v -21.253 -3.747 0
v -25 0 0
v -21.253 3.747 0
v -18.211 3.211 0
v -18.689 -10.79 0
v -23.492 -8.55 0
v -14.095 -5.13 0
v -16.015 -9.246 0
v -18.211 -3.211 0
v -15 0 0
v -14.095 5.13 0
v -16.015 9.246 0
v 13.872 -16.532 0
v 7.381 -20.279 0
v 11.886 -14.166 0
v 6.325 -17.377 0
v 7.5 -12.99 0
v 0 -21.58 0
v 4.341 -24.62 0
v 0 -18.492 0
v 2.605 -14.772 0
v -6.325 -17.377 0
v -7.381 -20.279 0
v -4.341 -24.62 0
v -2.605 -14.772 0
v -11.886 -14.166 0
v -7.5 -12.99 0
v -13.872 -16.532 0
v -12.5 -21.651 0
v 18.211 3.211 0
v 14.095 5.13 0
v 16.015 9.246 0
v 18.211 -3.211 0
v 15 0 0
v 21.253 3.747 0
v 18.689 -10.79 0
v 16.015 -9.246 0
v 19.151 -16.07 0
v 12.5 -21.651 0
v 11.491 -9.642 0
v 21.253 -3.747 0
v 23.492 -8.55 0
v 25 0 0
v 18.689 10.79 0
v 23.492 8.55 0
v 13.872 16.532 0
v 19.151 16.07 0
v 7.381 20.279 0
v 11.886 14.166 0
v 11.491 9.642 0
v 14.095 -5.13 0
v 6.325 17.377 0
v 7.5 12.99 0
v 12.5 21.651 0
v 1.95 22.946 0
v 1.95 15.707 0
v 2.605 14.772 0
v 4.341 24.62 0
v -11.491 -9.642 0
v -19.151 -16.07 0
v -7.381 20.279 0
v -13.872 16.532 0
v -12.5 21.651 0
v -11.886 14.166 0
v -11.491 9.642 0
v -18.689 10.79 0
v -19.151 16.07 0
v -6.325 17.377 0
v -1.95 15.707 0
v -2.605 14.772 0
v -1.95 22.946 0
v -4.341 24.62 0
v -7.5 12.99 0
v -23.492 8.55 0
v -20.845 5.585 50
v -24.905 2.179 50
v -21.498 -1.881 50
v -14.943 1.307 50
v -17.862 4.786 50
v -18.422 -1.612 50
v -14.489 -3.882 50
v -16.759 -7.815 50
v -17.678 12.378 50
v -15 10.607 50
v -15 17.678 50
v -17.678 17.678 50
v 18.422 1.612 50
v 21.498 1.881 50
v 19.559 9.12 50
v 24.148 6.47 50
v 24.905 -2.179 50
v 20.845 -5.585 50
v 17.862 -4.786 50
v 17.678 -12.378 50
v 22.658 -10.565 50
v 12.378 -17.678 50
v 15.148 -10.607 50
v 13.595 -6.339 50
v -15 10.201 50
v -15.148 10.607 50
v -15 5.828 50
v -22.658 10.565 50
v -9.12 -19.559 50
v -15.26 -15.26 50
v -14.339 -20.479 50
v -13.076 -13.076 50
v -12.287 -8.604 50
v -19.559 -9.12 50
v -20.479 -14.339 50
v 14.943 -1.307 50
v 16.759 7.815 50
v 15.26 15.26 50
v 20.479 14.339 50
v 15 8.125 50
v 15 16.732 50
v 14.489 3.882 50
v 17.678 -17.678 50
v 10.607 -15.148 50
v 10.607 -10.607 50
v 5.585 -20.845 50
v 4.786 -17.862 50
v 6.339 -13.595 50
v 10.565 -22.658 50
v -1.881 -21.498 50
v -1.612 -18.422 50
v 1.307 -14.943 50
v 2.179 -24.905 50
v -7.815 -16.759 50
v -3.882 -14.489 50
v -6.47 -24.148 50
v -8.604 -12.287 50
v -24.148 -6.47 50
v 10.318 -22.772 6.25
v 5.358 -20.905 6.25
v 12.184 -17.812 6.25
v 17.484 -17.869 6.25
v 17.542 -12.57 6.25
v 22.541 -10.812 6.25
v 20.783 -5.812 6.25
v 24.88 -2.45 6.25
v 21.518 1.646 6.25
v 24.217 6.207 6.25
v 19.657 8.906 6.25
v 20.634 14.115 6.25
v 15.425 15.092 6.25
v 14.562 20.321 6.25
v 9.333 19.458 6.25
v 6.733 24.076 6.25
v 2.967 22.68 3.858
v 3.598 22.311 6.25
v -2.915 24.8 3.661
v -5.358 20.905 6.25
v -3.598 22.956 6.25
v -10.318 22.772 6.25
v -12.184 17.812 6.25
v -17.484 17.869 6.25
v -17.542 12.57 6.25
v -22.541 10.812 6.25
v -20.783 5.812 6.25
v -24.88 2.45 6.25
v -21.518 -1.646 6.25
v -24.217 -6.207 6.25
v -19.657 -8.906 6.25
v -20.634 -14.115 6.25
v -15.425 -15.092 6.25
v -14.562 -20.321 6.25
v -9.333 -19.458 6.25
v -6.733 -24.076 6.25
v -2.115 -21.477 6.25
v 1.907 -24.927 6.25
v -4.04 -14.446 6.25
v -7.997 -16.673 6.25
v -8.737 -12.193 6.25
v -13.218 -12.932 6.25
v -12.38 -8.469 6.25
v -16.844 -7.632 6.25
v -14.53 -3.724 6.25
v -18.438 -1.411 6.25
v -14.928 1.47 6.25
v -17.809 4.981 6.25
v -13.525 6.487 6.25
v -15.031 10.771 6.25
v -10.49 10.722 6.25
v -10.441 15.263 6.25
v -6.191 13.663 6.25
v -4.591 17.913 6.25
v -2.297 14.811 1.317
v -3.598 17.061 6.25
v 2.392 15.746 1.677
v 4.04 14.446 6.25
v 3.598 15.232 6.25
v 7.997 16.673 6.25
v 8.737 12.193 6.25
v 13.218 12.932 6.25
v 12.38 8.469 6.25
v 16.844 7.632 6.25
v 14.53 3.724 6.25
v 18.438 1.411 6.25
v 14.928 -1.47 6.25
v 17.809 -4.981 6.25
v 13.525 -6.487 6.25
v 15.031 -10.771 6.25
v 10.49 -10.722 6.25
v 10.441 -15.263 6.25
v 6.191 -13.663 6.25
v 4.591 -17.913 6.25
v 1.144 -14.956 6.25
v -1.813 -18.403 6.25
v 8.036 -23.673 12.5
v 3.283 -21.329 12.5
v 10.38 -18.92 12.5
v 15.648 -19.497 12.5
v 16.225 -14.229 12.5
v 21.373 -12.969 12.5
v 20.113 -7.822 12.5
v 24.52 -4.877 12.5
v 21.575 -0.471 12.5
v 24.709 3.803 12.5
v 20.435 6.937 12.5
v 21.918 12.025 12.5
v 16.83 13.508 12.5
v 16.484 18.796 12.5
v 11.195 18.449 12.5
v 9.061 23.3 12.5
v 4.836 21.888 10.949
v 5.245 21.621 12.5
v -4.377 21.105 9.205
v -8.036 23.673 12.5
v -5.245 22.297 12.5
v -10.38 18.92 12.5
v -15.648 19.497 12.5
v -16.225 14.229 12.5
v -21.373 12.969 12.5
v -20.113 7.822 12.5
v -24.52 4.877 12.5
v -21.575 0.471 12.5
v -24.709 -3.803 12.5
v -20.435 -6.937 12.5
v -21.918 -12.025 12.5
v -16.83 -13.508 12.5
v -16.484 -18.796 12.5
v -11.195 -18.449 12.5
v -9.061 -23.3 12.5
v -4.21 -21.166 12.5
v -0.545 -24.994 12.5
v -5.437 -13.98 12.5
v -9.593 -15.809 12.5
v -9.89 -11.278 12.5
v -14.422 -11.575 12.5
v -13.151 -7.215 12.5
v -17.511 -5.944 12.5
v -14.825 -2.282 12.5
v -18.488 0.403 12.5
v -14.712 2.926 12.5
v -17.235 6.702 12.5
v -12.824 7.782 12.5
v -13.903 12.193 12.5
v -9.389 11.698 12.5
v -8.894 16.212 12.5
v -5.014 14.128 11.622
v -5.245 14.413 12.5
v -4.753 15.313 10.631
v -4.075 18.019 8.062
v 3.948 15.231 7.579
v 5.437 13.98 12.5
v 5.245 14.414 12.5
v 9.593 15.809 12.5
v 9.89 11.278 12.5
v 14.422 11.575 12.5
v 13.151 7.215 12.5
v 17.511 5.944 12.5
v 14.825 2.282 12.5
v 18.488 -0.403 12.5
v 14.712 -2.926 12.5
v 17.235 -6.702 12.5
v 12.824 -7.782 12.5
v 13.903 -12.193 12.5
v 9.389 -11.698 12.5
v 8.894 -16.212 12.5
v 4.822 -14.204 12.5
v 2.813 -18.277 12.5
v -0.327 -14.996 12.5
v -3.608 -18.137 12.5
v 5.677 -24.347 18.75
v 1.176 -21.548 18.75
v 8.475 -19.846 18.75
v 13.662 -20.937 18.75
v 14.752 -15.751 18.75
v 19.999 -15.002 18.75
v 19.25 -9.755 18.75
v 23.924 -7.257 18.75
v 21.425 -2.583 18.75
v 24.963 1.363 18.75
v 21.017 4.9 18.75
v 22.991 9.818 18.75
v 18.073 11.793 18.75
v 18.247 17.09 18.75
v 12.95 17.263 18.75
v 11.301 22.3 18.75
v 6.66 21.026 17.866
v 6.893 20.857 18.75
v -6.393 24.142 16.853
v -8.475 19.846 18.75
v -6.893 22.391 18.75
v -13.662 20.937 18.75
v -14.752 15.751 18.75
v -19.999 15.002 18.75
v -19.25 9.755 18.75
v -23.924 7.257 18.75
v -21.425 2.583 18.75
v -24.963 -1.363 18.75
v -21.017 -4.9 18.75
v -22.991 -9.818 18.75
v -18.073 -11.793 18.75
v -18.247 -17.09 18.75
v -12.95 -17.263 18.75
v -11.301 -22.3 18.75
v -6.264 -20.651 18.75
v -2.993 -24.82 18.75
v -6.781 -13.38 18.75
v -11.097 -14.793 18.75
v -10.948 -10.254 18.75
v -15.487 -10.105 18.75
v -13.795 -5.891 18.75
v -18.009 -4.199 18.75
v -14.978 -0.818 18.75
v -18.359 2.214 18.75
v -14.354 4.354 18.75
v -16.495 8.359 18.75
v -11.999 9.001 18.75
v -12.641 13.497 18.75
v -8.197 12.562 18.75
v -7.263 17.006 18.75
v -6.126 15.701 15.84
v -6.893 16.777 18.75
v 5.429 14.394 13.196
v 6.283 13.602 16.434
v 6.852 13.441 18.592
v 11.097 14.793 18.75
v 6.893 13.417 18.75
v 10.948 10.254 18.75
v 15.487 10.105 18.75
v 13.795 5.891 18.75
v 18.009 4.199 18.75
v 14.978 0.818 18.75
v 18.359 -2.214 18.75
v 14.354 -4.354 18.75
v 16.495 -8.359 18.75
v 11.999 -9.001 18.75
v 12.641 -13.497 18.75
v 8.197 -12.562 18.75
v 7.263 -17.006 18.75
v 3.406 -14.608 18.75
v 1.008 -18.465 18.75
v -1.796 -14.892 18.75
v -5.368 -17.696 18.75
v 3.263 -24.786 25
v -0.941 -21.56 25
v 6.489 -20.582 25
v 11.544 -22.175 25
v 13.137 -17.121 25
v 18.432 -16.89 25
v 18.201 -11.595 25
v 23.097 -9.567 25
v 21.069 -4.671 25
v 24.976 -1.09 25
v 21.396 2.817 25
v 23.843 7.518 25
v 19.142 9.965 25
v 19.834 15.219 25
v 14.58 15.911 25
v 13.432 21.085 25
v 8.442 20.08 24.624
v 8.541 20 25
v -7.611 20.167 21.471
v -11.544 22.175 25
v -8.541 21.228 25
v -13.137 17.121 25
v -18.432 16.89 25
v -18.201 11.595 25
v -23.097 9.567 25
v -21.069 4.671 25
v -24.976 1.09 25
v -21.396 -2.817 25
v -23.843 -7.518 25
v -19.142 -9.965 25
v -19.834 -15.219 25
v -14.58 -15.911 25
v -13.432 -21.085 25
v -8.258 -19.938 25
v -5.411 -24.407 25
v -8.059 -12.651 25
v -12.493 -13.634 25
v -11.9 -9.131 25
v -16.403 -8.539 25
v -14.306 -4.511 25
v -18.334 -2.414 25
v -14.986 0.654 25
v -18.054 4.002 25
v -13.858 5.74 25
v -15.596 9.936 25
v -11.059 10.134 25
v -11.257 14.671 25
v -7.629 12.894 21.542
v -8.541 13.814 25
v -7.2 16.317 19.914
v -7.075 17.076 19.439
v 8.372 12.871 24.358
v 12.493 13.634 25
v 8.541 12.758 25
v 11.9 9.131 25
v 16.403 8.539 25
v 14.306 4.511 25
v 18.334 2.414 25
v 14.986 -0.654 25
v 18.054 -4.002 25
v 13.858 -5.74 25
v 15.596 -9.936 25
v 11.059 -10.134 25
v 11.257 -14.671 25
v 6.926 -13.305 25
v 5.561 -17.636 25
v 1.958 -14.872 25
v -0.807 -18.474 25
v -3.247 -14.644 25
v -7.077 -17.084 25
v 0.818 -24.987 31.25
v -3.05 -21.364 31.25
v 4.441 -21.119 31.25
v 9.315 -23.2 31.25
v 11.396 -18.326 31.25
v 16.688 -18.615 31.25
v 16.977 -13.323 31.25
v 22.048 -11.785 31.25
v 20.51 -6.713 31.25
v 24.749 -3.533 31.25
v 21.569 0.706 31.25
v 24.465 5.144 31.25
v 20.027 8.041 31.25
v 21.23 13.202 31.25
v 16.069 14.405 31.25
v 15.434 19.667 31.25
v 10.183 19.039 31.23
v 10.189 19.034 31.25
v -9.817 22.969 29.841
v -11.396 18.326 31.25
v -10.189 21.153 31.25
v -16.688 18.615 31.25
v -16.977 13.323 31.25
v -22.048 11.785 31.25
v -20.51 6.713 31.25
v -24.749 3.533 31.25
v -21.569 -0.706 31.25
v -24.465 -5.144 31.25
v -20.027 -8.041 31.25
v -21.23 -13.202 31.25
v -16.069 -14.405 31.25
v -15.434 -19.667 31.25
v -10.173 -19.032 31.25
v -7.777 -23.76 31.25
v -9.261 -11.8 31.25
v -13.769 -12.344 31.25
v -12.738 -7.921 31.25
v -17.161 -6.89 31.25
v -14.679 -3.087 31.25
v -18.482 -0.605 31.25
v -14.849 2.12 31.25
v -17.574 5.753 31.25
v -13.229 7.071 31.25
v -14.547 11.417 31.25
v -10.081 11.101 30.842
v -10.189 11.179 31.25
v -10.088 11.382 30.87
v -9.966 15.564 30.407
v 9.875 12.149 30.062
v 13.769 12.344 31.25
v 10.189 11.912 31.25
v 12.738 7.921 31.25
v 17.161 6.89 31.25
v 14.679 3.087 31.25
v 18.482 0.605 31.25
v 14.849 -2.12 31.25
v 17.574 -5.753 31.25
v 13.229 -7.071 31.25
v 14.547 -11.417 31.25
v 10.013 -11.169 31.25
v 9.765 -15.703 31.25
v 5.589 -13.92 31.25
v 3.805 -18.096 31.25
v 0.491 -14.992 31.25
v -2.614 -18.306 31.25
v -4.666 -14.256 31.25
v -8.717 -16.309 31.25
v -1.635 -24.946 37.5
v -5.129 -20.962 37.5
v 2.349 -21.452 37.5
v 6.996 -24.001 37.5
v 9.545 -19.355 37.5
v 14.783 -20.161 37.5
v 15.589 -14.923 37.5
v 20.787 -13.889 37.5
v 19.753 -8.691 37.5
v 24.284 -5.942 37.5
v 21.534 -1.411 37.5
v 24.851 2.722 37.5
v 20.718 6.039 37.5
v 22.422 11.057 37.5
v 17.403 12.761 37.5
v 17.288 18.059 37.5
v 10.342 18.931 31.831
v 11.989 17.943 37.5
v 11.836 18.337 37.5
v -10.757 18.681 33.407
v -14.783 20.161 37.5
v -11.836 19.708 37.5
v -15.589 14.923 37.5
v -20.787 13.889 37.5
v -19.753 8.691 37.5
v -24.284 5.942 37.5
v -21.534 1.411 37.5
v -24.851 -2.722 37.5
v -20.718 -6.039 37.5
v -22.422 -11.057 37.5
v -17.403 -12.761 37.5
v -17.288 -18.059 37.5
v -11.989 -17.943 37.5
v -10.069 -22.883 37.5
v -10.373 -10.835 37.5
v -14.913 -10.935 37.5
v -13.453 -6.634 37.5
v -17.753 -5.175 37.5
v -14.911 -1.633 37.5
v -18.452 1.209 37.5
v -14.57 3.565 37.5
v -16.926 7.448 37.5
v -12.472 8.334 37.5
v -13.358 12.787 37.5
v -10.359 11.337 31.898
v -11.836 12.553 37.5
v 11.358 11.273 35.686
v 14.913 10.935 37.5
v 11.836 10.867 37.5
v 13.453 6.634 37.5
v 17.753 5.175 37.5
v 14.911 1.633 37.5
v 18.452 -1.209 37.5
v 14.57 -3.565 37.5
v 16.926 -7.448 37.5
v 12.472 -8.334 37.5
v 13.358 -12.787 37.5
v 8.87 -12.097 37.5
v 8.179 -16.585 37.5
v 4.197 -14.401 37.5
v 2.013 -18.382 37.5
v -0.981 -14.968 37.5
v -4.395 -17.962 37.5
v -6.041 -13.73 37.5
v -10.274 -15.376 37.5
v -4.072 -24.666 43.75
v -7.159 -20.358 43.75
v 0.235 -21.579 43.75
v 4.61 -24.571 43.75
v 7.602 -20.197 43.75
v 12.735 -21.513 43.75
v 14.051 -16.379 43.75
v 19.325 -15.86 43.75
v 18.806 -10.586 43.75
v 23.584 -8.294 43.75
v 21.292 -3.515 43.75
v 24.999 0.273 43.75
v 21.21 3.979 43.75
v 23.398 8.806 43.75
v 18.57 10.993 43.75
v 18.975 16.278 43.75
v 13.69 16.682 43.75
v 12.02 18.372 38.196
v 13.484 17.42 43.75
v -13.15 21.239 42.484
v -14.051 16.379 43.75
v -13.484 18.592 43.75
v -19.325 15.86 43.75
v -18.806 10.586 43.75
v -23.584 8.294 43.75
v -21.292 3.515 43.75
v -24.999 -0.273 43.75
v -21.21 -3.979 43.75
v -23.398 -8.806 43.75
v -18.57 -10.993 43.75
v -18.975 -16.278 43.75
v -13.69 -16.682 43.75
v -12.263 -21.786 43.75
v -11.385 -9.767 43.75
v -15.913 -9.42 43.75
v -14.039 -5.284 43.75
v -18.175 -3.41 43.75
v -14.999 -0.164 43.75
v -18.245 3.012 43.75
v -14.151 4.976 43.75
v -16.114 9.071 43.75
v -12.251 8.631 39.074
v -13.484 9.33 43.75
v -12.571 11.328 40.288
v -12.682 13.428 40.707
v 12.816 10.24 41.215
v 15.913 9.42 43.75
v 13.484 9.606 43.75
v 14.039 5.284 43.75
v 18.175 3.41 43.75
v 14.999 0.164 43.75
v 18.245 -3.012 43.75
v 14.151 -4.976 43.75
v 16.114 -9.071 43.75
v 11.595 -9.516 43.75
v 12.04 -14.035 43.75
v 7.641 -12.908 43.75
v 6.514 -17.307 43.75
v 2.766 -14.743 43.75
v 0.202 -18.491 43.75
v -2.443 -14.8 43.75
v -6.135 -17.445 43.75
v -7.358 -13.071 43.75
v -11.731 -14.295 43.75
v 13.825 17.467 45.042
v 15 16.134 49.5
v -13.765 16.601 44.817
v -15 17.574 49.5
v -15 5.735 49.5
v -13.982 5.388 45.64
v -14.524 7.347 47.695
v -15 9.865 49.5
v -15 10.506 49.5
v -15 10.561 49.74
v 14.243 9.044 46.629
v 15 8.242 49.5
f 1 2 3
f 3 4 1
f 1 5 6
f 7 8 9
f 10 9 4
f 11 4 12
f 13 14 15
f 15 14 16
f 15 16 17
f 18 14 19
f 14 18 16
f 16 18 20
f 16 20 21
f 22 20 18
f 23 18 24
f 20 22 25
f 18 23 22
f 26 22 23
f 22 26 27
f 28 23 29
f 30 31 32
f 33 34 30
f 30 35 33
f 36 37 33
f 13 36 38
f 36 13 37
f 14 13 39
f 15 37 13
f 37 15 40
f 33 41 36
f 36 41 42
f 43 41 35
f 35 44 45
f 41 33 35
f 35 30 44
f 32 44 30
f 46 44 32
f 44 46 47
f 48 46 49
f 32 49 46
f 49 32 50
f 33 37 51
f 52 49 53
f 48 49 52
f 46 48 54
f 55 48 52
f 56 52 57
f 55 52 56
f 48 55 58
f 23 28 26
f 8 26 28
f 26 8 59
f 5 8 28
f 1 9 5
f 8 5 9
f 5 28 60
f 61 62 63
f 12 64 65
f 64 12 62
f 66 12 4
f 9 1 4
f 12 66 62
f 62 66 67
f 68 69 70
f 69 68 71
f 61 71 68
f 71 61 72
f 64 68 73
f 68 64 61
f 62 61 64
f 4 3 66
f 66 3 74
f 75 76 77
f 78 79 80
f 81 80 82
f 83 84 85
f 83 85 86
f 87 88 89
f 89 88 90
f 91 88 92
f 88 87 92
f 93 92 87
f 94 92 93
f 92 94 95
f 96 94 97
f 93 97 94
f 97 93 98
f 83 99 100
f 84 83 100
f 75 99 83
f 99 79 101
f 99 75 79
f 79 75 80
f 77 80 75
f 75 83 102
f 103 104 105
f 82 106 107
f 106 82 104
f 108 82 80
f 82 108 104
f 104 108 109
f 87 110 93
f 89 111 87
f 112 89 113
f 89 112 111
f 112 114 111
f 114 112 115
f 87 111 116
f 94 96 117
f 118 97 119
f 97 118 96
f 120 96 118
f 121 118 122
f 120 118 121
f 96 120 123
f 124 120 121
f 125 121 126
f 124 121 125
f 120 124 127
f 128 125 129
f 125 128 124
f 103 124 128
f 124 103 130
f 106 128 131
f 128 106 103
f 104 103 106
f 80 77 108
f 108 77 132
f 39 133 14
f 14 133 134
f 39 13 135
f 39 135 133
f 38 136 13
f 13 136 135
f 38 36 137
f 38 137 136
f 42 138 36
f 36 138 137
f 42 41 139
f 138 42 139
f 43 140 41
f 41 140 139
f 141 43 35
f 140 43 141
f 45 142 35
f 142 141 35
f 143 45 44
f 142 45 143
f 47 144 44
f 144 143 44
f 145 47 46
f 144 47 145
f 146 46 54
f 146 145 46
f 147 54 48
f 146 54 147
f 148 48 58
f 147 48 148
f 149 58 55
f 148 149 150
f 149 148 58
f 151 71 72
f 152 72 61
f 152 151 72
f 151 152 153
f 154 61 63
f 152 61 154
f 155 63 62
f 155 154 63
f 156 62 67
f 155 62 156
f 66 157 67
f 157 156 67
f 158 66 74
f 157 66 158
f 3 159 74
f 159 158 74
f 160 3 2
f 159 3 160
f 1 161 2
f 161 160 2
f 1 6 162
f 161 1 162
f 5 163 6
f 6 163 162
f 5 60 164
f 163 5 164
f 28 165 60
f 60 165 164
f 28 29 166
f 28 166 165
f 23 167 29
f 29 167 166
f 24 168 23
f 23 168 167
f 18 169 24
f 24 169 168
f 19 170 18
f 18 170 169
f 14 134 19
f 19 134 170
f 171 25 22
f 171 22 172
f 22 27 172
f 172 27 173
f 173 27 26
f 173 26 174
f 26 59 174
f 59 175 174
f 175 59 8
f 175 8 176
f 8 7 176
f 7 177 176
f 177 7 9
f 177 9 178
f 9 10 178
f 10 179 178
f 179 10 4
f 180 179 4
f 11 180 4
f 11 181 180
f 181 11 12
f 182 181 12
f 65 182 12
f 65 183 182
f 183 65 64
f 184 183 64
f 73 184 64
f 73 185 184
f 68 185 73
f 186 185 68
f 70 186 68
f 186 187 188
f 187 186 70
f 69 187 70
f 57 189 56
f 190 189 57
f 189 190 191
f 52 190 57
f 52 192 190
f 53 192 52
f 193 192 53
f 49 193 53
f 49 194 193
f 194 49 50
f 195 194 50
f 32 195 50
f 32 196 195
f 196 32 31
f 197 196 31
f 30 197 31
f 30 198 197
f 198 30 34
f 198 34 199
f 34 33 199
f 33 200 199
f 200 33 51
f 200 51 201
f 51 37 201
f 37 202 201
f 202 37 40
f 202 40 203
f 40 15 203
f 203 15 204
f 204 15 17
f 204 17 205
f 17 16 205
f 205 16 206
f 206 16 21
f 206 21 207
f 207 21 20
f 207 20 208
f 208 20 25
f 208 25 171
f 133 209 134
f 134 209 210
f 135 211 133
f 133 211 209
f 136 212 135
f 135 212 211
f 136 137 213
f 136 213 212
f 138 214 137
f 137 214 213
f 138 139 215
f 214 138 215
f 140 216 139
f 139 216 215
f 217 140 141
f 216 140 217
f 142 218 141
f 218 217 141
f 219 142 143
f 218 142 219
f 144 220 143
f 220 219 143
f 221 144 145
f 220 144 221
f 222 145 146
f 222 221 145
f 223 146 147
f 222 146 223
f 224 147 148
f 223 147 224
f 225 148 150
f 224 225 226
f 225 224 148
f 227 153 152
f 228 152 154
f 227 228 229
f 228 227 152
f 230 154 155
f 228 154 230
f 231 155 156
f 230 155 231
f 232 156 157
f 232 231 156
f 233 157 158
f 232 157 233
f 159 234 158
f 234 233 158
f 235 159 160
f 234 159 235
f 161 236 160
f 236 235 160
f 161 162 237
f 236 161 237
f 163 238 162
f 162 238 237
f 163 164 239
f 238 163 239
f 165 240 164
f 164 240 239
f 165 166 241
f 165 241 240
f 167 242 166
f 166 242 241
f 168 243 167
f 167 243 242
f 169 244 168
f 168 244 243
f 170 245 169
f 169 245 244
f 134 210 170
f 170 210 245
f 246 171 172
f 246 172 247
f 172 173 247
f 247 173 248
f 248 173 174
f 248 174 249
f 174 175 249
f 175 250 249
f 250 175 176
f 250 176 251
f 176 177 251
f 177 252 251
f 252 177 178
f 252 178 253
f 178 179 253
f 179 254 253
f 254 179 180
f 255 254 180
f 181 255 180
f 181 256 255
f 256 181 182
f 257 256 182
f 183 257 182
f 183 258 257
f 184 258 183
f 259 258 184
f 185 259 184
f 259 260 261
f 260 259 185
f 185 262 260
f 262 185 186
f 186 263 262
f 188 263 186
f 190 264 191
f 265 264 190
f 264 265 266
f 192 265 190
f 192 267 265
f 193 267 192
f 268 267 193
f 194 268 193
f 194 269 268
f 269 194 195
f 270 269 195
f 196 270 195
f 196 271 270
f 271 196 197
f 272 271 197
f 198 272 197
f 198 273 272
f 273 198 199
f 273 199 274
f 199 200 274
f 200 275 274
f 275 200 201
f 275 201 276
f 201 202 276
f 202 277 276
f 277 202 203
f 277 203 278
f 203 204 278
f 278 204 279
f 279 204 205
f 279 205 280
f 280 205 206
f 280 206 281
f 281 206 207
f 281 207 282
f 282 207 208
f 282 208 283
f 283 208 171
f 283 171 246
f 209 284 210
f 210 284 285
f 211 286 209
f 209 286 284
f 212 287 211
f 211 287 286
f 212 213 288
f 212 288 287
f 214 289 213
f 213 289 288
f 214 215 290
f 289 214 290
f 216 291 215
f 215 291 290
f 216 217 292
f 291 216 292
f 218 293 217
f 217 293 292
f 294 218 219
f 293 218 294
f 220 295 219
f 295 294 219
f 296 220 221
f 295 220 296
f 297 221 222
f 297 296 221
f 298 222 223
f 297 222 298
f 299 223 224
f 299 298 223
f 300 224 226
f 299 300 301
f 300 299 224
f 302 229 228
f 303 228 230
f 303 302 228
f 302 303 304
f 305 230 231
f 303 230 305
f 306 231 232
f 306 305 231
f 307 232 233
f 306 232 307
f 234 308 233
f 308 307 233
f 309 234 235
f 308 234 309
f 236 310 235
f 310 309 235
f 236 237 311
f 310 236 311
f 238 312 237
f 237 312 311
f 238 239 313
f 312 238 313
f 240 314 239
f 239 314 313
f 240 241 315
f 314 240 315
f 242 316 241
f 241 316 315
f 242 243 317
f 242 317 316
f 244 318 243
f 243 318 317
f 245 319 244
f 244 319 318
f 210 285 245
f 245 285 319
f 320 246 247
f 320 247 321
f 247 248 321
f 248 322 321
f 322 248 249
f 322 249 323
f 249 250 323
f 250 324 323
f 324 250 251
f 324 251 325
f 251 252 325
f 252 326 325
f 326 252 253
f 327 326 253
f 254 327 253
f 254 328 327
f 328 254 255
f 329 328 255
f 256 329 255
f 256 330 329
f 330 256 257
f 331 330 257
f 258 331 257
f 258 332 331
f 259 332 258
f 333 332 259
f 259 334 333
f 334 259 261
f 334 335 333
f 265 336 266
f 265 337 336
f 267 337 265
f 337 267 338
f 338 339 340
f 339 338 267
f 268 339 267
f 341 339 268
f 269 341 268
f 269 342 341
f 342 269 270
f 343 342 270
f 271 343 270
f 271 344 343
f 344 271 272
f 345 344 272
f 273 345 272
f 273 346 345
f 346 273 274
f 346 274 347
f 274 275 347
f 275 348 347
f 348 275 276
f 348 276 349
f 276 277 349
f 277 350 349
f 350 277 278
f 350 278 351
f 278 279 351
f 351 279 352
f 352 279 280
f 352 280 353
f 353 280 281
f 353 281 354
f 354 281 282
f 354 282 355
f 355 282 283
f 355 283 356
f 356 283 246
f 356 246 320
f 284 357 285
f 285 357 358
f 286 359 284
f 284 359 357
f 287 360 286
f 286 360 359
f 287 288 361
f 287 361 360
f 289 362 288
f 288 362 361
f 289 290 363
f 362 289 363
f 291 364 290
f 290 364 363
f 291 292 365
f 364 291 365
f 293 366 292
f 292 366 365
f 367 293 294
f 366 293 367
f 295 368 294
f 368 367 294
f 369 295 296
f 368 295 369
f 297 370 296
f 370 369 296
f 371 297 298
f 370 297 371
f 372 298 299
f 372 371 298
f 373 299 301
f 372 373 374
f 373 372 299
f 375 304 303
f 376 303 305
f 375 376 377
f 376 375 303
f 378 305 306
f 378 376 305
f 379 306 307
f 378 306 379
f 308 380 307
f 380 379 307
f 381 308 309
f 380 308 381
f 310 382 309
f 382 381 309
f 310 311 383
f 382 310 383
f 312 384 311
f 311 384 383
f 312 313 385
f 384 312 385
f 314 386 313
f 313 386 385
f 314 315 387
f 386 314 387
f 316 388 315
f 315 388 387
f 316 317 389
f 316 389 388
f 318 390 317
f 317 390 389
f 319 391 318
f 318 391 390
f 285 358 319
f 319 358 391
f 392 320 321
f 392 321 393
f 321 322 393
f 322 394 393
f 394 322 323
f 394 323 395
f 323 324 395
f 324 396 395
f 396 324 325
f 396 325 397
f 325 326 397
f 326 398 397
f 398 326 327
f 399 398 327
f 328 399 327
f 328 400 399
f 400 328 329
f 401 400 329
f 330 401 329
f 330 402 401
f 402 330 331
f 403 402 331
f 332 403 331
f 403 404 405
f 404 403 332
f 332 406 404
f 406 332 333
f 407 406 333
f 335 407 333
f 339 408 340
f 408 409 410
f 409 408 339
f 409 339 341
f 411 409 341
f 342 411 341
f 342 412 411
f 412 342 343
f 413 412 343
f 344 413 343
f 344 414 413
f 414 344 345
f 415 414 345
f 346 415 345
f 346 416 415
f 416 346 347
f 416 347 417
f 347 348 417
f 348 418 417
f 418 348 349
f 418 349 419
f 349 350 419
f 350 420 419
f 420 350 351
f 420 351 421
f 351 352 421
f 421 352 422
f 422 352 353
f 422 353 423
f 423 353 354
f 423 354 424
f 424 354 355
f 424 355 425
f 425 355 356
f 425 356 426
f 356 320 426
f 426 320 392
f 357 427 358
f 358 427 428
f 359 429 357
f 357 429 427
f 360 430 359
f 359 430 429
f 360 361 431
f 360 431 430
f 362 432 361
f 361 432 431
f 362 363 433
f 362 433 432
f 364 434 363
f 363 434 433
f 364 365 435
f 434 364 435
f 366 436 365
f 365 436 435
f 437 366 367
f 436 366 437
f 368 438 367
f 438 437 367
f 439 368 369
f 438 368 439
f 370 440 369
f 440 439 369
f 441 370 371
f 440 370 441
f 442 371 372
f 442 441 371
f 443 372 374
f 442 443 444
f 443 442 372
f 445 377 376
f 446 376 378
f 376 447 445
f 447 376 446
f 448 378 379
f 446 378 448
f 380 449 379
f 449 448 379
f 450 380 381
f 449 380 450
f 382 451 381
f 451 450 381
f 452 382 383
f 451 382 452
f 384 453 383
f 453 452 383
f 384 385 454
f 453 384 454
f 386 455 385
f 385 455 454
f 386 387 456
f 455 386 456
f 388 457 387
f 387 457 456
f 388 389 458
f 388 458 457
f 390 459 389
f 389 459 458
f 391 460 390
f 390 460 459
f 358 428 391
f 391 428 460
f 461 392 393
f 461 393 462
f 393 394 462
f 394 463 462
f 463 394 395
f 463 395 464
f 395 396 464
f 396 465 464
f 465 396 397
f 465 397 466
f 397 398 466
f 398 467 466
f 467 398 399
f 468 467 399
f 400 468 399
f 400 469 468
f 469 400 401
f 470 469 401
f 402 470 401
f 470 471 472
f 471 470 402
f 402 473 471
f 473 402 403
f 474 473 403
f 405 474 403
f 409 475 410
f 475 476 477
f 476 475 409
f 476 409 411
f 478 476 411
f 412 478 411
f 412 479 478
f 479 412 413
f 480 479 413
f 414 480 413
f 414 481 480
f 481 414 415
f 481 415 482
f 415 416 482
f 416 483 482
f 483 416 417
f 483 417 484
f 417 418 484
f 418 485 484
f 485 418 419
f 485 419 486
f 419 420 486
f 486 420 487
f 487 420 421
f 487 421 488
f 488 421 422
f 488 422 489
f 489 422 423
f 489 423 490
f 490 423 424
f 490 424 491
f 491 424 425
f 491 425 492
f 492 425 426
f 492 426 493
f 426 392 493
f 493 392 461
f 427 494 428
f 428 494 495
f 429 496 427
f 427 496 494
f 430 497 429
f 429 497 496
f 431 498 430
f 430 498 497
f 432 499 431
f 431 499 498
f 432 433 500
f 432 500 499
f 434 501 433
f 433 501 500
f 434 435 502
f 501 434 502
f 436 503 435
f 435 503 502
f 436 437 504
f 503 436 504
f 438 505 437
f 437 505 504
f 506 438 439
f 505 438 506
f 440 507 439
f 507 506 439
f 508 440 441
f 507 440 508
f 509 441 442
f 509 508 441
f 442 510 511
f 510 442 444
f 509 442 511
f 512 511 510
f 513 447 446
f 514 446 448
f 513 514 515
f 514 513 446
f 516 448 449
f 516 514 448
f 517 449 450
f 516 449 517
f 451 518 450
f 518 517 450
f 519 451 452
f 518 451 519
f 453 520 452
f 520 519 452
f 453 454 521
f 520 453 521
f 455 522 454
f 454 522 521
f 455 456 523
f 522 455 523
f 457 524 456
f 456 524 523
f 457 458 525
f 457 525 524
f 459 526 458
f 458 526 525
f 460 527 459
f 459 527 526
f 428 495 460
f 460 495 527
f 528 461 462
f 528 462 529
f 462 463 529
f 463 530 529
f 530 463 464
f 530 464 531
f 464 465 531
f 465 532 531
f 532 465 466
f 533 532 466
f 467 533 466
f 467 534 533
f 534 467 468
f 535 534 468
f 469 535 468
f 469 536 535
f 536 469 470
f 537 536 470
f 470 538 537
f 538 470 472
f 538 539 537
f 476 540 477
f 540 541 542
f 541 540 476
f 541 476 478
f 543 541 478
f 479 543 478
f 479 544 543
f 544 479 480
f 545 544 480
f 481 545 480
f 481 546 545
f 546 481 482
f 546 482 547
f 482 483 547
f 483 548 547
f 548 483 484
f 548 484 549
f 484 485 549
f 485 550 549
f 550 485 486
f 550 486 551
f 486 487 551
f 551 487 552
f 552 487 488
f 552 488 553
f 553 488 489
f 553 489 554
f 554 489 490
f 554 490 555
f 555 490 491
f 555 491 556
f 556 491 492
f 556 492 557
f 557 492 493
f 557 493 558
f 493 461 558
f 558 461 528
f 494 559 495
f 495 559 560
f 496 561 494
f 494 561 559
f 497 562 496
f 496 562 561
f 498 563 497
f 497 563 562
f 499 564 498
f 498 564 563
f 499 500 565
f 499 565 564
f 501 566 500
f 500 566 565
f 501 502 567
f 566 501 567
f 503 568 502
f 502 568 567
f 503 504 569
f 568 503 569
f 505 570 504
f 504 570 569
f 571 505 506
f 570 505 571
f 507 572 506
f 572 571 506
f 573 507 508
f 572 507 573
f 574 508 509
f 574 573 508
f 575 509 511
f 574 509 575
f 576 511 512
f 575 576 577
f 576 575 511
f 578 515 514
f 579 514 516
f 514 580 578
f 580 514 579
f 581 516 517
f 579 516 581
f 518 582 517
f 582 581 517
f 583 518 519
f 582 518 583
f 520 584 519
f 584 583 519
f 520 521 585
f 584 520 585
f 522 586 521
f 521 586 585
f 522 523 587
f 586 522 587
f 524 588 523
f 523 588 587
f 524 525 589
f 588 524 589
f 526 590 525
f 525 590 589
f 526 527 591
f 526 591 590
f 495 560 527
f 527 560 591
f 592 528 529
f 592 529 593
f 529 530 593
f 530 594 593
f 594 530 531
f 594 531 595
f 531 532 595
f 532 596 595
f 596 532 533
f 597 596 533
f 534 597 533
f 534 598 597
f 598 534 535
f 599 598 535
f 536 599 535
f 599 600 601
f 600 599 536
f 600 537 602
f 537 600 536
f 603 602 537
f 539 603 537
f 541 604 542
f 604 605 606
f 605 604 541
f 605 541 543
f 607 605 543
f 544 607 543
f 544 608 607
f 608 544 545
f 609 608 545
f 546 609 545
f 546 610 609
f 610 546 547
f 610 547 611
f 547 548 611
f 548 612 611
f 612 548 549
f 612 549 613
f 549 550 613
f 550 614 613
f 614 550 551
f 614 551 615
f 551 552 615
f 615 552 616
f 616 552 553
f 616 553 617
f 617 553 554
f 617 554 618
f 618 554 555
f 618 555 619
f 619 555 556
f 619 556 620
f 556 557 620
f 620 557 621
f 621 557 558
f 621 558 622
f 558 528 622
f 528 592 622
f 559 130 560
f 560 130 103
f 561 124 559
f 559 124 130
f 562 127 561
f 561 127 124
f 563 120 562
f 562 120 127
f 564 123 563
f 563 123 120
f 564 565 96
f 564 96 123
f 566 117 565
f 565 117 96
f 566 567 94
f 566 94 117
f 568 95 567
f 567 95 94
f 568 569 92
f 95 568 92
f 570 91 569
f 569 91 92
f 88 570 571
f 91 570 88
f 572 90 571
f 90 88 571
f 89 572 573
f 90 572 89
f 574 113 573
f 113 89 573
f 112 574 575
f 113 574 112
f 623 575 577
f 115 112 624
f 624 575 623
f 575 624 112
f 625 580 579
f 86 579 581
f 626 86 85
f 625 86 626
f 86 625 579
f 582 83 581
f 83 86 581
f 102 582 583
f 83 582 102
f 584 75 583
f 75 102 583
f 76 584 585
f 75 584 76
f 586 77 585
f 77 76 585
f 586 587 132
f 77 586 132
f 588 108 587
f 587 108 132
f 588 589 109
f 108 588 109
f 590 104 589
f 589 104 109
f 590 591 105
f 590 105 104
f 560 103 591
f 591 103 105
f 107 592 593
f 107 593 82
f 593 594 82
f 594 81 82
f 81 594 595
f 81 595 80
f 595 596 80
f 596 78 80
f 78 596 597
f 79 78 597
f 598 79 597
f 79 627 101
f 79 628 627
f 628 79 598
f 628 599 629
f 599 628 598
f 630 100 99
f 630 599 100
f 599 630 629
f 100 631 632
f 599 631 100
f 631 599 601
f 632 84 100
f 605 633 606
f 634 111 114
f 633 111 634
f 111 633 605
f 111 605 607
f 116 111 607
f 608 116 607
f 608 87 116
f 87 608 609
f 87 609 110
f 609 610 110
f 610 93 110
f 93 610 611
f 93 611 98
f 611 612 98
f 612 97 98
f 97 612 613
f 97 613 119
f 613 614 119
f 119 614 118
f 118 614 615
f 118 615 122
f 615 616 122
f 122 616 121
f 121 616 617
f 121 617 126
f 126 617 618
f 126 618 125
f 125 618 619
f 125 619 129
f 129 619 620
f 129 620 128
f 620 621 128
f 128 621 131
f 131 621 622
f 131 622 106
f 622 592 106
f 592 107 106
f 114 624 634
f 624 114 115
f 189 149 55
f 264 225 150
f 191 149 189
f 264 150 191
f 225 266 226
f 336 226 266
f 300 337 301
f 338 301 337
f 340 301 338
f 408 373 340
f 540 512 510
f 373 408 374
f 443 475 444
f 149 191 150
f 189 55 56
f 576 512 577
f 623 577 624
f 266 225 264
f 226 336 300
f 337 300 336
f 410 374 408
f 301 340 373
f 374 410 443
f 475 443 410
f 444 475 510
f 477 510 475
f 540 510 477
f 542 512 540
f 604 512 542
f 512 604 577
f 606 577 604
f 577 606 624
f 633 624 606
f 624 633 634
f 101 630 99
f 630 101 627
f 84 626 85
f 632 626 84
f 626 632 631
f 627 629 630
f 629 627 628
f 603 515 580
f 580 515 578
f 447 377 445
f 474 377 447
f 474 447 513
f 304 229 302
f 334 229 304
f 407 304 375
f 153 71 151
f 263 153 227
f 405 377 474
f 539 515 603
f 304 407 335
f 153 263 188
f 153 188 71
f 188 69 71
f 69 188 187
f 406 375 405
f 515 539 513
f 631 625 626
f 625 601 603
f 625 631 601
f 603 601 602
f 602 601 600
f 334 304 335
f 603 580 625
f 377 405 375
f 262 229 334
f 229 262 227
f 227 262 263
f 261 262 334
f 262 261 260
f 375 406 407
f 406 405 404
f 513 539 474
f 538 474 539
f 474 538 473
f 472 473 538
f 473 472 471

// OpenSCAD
STEP = 20;

difference() {
  union() {
    linear_extrude(50, twist = 45, slices = 8, $fn = 32, convexity = 20)
      union() {
        for (i = [0 : STEP : 360 - STEP])
          rotate([0, 0, i])
            translate([20, 0, 0])
              circle(d = 10, $fn = 4);
      }
    
      *cylinder(1, d = 40);
  }
    
  translate([0, 20, -5])
    hull() {
      cube([1, 30, 1], center = true);  
      translate([0, 0, 55]) cube([30, 30, 1], center = true);
    }
  }      
